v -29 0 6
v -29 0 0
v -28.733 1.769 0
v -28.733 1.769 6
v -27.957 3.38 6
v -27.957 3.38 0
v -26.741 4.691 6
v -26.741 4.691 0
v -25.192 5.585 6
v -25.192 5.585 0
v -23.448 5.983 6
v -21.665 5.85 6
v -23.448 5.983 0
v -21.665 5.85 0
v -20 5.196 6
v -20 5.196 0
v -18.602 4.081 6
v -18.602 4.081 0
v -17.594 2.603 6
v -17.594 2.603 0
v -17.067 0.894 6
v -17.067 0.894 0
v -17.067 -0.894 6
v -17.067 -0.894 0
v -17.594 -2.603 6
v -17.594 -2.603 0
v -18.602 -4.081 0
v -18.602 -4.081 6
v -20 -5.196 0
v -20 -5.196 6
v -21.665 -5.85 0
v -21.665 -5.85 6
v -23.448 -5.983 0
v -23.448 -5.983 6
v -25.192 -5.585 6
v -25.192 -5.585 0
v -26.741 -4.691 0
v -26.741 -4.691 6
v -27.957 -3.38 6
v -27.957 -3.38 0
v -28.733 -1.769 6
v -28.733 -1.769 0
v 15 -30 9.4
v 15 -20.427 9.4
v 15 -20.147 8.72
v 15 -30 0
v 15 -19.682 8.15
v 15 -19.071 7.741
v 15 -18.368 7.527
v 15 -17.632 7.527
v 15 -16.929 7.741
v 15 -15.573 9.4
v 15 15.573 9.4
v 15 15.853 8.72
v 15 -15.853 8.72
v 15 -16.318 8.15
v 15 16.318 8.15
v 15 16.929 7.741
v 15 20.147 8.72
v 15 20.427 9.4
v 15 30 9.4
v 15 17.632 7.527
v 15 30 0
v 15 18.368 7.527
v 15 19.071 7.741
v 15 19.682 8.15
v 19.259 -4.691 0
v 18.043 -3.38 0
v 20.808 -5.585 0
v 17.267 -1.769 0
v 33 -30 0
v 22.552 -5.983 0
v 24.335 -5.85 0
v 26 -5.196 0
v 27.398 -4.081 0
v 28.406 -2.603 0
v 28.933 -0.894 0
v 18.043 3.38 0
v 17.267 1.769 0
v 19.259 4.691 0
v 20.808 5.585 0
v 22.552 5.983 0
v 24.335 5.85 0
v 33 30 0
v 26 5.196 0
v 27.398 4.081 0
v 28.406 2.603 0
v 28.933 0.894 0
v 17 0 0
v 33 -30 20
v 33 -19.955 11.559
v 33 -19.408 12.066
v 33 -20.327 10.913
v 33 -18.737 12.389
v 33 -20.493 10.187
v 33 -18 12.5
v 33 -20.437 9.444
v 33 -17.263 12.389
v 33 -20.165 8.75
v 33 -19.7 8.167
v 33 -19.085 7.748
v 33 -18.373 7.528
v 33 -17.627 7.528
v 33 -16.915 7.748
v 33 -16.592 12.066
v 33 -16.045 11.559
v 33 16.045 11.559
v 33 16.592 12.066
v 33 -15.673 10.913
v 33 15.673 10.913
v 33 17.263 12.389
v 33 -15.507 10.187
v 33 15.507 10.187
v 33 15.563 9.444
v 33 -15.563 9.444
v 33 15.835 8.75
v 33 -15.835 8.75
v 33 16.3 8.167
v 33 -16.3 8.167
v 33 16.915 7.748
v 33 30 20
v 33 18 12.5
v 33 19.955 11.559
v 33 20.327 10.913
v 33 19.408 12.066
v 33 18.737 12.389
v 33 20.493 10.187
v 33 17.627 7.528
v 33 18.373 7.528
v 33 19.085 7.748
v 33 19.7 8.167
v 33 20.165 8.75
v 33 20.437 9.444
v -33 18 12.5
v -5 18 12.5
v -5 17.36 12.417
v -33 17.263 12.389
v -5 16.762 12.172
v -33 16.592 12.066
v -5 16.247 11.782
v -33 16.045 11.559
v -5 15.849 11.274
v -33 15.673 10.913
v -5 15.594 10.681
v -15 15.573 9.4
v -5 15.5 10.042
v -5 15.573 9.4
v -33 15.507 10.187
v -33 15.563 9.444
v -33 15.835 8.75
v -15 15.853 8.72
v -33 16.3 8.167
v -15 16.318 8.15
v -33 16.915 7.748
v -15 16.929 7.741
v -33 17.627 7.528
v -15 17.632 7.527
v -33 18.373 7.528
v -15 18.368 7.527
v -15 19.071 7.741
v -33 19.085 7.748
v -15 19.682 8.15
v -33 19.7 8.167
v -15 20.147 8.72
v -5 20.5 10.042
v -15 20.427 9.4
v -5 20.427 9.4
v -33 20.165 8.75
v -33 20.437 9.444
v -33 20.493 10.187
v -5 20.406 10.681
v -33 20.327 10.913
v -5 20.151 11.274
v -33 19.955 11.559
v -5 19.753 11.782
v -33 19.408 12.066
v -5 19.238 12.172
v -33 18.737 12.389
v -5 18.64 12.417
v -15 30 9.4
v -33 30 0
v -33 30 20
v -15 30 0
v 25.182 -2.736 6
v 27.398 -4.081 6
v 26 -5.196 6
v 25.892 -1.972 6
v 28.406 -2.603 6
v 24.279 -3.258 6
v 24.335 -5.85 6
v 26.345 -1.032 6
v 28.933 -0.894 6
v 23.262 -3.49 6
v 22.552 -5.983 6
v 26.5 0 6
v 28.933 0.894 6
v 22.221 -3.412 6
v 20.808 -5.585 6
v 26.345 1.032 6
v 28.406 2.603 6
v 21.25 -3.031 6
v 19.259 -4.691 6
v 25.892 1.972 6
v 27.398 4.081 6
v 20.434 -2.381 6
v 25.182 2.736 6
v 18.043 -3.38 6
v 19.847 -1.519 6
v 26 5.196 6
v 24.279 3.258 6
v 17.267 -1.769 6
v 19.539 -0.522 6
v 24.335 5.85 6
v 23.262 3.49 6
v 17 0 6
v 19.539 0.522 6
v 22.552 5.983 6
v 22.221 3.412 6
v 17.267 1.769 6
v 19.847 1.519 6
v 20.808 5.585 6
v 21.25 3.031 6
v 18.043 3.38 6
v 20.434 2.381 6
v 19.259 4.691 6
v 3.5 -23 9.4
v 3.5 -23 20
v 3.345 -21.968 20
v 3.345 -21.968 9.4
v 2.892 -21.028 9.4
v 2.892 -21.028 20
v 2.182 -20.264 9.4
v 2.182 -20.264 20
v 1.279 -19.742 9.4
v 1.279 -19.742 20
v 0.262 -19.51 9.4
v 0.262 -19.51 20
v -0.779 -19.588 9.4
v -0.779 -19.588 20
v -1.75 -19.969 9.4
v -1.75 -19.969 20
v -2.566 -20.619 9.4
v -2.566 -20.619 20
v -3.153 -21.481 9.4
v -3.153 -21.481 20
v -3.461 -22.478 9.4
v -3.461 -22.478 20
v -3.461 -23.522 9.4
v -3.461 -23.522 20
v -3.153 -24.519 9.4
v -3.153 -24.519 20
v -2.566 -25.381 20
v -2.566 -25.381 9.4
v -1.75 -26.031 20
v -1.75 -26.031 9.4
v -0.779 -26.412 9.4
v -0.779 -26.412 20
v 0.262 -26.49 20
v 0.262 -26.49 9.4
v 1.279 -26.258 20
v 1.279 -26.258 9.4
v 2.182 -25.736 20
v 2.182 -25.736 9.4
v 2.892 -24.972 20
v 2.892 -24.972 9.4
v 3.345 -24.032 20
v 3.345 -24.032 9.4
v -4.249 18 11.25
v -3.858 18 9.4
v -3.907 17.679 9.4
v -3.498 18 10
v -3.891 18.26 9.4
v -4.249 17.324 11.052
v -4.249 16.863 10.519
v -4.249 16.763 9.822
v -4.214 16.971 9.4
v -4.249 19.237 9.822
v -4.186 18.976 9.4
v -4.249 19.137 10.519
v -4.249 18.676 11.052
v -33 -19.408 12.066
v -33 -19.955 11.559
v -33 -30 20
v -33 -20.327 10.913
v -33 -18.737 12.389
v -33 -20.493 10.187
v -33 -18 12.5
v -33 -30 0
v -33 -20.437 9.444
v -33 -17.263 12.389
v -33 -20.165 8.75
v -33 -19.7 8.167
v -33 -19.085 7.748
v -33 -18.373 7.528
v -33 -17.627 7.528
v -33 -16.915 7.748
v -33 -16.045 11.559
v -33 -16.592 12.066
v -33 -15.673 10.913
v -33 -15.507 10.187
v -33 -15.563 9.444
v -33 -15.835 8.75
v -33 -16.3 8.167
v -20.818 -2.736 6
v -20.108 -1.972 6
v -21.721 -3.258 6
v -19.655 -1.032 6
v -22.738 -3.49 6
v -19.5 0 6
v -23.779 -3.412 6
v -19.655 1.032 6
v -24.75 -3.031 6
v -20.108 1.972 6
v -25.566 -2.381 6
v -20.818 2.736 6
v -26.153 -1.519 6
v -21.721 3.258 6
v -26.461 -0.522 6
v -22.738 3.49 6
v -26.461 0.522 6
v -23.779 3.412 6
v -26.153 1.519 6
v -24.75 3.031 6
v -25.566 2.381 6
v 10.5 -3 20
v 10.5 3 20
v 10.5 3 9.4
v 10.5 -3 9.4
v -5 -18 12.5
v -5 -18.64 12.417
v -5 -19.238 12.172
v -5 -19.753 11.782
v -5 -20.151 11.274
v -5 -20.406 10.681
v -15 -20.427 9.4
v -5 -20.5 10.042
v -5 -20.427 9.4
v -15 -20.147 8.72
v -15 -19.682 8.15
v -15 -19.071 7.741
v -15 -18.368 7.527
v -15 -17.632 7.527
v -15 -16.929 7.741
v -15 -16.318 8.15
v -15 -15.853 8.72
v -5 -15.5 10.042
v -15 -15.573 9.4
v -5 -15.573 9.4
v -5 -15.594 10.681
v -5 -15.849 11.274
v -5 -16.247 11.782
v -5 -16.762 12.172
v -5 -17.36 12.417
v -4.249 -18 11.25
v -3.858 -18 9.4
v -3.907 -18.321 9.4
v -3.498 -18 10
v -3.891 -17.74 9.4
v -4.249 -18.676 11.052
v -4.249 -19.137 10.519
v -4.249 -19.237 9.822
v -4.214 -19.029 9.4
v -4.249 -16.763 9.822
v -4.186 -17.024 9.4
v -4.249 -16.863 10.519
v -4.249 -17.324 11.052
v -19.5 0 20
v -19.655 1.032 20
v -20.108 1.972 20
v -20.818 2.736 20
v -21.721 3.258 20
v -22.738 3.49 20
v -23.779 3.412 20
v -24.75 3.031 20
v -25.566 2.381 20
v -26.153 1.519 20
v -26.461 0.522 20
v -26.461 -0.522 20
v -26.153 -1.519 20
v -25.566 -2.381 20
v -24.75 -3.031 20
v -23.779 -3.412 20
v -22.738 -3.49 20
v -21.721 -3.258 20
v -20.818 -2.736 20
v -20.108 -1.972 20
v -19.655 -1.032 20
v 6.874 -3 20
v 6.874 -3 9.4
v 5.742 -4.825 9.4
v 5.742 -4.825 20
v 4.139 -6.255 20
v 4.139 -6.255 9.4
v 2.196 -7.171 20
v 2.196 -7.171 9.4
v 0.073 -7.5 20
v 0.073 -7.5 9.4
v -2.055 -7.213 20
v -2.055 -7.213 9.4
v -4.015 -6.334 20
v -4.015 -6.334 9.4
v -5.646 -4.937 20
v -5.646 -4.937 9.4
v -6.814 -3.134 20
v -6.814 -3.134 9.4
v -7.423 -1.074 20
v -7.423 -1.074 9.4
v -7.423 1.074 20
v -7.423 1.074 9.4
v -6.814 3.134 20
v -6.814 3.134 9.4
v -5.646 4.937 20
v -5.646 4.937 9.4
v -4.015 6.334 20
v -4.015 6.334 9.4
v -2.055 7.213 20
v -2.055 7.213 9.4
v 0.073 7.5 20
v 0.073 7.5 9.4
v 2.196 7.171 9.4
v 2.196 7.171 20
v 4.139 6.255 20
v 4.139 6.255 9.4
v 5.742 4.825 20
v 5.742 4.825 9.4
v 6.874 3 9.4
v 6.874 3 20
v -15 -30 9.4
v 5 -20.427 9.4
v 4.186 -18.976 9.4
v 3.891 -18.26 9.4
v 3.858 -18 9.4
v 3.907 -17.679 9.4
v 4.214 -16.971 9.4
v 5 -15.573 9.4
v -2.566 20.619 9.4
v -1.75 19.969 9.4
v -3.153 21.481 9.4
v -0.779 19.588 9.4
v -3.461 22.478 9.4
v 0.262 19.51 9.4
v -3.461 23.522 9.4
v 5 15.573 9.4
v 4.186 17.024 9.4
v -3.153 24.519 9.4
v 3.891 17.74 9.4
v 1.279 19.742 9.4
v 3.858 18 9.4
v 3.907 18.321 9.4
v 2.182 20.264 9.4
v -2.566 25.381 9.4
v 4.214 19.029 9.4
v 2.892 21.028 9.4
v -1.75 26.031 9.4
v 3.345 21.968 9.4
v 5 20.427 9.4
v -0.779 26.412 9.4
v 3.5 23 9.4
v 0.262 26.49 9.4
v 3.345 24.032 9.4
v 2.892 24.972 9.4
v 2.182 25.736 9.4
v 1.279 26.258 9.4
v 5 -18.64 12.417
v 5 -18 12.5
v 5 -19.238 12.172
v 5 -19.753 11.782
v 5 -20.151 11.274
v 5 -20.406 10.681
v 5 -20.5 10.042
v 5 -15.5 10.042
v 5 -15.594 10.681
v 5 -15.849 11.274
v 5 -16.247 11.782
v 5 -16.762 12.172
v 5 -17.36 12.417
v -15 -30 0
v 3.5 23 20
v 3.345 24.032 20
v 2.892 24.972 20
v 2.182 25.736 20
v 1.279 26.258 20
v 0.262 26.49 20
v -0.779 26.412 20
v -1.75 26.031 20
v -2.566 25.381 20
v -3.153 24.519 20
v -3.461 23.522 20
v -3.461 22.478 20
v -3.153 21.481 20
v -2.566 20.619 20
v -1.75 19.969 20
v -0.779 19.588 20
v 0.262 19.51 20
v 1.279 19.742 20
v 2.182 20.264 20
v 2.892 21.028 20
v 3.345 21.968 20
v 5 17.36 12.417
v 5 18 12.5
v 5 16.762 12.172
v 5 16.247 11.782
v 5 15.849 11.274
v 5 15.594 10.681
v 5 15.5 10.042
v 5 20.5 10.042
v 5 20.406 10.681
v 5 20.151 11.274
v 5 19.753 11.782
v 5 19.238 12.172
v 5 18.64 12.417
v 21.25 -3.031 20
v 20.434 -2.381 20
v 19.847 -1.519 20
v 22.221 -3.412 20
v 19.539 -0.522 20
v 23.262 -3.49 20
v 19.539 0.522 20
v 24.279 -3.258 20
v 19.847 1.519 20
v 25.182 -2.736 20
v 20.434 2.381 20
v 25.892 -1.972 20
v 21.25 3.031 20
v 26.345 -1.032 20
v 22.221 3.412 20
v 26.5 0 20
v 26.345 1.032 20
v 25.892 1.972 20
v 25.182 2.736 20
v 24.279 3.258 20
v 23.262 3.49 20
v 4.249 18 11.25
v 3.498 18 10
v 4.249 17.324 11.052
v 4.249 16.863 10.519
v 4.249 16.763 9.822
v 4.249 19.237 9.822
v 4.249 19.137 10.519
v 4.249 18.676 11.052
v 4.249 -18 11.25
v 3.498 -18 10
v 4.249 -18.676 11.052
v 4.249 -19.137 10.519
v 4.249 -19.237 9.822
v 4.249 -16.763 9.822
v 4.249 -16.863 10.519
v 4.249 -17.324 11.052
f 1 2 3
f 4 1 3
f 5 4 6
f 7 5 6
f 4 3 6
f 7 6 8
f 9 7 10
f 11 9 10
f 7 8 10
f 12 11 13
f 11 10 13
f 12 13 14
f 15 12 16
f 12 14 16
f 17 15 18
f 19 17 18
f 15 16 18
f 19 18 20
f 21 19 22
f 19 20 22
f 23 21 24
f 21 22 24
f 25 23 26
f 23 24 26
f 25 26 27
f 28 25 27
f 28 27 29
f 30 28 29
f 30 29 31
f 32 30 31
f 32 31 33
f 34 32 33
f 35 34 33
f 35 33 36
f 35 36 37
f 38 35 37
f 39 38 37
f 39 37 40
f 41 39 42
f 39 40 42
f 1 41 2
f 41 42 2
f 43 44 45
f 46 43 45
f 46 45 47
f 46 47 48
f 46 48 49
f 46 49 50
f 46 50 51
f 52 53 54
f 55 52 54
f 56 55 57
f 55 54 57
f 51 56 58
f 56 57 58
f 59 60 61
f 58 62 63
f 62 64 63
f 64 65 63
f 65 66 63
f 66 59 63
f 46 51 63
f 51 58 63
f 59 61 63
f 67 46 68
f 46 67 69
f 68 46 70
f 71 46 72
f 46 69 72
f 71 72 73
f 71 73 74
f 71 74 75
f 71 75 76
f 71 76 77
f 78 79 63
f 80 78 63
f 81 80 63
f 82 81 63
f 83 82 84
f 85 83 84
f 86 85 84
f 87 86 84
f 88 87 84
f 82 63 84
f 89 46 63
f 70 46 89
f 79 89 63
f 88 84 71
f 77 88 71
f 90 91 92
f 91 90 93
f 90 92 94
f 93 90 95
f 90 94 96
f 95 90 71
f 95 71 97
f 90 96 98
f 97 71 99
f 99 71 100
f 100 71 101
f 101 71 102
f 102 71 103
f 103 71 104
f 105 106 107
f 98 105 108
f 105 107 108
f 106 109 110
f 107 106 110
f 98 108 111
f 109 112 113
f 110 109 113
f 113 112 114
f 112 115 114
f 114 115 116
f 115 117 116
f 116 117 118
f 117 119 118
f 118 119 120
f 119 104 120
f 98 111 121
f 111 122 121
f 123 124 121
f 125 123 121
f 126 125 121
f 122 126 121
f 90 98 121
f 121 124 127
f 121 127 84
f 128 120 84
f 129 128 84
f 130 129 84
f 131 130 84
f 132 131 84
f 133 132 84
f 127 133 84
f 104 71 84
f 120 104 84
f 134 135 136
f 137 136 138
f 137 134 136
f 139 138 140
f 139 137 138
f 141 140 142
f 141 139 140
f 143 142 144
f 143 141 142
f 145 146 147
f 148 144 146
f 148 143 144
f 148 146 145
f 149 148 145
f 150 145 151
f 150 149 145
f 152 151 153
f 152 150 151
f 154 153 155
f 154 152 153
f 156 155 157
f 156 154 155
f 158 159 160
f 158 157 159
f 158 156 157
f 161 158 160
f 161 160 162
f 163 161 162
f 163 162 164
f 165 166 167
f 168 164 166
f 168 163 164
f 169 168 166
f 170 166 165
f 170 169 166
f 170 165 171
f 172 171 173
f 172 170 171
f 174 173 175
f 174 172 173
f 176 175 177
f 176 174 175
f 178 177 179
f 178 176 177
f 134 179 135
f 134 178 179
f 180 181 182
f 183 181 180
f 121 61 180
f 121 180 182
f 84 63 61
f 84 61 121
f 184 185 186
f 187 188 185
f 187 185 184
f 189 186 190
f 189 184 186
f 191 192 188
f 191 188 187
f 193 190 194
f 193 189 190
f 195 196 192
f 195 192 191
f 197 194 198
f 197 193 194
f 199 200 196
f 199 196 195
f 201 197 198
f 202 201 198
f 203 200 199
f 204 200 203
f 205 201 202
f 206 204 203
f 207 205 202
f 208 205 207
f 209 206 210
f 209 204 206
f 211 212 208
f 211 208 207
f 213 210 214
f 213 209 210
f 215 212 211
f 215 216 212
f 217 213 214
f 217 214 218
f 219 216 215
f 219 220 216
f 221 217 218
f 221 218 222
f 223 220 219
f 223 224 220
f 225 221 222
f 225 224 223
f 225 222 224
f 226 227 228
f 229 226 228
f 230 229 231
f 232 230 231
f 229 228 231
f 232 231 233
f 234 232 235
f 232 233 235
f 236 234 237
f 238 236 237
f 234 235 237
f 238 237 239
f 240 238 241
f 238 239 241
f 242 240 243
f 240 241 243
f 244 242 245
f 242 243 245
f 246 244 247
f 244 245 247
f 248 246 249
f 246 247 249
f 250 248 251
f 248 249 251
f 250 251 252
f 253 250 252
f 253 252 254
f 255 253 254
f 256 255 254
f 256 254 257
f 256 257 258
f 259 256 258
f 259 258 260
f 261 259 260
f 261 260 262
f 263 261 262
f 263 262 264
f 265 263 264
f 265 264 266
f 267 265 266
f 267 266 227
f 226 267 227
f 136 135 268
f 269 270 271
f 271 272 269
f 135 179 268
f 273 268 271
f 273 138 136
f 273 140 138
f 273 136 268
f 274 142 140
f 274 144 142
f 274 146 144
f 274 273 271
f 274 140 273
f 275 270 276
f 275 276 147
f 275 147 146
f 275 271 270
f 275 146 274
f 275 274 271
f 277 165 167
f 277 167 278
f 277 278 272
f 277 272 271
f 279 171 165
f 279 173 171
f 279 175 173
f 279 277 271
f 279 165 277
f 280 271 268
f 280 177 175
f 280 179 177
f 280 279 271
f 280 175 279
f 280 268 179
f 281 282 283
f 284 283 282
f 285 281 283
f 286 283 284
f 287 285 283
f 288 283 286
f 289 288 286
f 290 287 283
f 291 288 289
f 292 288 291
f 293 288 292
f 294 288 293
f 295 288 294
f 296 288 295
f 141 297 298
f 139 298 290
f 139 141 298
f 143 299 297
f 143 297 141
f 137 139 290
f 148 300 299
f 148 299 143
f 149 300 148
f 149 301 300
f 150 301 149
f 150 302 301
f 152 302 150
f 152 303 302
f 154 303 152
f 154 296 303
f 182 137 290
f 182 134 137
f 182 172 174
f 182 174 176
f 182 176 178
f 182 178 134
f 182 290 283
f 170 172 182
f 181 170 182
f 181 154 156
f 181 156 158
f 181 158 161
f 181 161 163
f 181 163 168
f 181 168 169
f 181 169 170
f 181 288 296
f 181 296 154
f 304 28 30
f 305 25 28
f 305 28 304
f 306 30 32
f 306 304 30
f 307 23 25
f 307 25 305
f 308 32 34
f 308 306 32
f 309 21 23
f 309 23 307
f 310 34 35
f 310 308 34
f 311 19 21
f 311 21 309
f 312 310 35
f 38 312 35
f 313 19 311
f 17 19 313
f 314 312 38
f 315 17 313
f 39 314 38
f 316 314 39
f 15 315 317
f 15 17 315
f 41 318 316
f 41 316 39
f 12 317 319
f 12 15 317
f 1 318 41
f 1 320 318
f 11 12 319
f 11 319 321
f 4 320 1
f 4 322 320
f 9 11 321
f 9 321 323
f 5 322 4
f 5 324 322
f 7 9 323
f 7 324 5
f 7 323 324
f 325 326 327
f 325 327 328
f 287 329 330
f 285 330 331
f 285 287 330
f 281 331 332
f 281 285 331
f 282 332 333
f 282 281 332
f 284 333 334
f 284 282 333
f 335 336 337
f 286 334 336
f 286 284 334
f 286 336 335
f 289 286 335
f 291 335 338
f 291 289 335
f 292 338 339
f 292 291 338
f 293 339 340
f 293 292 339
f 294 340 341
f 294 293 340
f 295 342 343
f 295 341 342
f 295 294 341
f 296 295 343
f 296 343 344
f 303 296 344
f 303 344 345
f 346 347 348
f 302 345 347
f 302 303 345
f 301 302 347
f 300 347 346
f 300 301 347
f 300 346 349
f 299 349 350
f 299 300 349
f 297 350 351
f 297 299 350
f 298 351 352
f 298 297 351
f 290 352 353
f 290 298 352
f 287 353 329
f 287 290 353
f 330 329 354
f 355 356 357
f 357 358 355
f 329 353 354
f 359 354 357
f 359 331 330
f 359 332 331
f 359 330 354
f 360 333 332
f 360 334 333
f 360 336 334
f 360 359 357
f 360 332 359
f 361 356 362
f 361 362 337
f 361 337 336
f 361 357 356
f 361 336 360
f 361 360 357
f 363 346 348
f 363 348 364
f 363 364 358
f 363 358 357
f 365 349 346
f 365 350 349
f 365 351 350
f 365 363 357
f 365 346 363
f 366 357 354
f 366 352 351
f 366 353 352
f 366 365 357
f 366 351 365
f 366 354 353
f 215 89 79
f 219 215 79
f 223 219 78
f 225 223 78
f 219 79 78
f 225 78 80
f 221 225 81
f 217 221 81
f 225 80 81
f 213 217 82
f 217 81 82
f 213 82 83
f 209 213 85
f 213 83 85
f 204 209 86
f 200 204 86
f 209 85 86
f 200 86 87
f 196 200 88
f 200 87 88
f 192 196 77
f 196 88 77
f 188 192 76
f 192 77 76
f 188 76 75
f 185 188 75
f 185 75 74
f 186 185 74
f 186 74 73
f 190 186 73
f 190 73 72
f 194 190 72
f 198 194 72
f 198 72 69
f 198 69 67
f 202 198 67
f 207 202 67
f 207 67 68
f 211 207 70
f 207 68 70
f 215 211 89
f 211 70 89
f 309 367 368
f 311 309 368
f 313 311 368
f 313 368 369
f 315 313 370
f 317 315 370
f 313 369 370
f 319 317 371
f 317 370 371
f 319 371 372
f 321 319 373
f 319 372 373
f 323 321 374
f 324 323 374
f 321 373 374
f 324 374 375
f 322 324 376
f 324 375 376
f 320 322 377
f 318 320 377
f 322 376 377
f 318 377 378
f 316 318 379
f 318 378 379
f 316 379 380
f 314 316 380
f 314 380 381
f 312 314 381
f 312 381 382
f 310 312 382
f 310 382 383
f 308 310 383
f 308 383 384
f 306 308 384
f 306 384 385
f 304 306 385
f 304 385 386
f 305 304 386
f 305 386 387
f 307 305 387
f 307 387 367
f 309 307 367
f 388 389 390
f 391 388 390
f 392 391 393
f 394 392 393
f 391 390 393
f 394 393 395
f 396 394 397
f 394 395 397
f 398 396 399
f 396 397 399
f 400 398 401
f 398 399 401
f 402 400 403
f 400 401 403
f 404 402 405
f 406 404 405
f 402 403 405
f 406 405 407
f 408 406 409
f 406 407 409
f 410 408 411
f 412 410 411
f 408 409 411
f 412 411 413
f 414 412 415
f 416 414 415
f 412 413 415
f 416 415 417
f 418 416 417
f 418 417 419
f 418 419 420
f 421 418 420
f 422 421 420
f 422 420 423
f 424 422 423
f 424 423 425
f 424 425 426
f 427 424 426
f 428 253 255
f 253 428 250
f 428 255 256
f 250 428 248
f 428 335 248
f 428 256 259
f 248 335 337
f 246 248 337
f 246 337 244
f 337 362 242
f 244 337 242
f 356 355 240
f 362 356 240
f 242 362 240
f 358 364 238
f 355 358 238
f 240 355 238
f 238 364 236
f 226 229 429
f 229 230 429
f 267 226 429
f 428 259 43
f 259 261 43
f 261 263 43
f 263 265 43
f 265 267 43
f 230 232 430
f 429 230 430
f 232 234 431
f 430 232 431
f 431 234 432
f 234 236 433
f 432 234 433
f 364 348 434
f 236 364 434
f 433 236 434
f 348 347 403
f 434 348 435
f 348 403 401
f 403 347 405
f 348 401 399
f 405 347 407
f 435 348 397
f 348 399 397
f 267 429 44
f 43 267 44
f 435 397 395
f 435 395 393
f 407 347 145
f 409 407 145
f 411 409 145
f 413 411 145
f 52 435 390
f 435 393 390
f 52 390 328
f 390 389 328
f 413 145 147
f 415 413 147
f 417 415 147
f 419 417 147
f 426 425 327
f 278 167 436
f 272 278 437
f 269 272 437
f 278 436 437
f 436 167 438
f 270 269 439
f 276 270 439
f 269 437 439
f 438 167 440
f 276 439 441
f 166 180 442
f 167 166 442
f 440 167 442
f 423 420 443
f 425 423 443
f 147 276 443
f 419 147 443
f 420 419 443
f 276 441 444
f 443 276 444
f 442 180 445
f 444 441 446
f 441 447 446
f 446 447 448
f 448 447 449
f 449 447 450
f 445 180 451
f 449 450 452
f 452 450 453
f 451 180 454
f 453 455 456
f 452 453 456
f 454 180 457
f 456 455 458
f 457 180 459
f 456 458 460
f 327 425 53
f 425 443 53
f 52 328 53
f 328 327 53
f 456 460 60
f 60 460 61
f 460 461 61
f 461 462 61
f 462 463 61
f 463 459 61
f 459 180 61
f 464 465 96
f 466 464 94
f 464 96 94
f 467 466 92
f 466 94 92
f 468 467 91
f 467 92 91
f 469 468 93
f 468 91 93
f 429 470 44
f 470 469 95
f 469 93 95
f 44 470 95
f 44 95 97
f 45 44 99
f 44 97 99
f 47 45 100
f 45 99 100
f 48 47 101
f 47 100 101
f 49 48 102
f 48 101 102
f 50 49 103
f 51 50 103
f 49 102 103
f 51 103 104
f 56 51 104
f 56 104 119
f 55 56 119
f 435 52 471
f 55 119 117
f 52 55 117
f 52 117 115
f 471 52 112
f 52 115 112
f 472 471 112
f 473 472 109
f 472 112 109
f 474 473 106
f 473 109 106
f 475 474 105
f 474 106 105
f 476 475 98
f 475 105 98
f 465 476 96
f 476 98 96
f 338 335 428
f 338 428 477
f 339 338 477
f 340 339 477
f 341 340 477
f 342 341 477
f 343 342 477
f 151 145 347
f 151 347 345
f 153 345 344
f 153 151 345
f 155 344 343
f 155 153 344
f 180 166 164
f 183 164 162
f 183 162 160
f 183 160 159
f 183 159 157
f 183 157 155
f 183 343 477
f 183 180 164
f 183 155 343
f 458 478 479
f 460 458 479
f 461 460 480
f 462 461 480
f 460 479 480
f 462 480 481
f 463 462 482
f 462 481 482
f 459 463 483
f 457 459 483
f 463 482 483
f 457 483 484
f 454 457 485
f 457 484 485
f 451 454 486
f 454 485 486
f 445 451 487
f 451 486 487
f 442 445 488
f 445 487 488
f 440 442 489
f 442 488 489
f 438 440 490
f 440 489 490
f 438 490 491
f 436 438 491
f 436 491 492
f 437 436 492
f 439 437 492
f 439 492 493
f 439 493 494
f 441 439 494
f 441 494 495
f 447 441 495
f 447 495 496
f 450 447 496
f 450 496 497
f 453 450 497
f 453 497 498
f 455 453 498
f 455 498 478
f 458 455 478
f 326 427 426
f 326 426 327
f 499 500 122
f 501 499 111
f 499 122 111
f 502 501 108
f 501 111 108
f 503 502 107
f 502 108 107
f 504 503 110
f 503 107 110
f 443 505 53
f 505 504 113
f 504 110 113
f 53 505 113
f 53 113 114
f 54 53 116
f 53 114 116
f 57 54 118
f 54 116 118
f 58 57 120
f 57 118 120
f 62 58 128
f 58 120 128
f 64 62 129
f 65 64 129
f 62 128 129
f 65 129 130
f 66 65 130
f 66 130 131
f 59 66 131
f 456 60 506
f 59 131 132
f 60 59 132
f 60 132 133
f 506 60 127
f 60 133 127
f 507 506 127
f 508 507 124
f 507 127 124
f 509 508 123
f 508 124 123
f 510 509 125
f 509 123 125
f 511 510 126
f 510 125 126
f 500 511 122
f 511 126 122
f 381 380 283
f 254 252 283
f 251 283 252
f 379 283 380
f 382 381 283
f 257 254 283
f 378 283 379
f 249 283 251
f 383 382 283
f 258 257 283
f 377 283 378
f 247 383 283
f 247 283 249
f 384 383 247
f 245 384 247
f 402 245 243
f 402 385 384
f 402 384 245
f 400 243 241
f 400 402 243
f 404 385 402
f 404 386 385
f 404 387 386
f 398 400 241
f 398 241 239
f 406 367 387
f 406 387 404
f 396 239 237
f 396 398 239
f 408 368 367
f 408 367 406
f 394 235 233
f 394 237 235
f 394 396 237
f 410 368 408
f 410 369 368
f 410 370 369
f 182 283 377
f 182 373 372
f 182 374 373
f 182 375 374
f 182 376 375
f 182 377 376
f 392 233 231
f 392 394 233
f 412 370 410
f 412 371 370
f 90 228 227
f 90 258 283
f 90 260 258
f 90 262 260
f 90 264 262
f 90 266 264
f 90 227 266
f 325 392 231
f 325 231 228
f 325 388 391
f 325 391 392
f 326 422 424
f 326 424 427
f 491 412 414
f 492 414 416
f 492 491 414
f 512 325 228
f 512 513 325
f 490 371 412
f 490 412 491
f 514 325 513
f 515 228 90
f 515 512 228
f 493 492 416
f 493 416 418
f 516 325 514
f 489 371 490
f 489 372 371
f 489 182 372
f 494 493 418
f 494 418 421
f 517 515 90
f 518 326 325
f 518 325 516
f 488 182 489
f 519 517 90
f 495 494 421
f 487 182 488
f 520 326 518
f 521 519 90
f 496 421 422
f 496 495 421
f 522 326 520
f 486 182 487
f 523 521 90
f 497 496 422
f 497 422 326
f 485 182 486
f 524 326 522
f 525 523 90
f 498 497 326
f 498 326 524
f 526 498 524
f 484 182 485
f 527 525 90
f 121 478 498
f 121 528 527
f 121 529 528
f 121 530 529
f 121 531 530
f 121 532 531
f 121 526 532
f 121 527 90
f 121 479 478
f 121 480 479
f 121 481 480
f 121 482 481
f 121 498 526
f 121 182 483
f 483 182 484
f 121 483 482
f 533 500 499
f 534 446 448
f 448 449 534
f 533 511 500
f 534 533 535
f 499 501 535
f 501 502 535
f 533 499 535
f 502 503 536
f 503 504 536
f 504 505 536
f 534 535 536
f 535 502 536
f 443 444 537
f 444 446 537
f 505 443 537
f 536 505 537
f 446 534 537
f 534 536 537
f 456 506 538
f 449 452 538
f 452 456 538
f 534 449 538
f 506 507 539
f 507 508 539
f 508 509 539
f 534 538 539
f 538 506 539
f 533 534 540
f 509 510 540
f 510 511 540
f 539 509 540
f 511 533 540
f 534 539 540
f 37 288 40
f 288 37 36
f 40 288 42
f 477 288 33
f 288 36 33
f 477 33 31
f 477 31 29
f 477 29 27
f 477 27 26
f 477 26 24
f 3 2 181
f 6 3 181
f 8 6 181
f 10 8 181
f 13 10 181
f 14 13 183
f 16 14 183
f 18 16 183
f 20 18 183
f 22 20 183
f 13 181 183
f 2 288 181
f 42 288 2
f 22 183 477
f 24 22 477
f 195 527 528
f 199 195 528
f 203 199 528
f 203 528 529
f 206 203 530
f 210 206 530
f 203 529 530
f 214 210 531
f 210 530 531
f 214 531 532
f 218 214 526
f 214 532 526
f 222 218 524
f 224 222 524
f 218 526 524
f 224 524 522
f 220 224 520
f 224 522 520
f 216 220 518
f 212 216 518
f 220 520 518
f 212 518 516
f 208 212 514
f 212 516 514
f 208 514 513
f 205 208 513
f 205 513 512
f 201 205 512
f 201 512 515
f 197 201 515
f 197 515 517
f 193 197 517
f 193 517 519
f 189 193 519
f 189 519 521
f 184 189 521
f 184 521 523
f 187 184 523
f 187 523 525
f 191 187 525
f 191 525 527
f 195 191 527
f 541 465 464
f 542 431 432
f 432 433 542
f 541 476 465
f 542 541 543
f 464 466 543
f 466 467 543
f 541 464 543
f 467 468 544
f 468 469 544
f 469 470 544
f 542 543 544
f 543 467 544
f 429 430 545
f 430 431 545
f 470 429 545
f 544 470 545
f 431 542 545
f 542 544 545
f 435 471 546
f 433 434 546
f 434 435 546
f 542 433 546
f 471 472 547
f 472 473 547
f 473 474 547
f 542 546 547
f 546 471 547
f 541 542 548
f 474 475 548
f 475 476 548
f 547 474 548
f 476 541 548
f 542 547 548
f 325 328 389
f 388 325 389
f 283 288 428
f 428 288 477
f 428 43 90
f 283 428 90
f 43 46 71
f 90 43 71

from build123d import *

# Parameters (mm, degrees)
SKETCH1_W                  = 66
SKETCH1_H                  = 60
BOSS_EXTRUDE1_DEPTH        = 20
CUT_EXTRUDE1_REACH         = 62
SKETCH2_W                  = 30
SKETCH2_H                  = 9.4
M6_TAPPED_HOLE1_AT_2_COUNT = 2
M6_TAPPED_HOLE1_AT_2_PITCH = 36
SKETCH7_R                  = 3.5
CUT_EXTRUDE2_DEPTH         = 21
SKETCH9_R                  = 6
CUT_EXTRUDE3_DEPTH         = 6


with BuildPart() as part:
    # Sketch1 → Boss-Extrude1 (new body)
    with BuildSketch(Plane.XY):
        Rectangle(SKETCH1_W, SKETCH1_H)
        with BuildLine():
            Line((10.5, -3), (6.873863542, -3))
            ThreePointArc((6.873863542, -3), (-7.5, 0), (6.873863542, 3))
            Line((6.873863542, 3), (10.5, 3))
            Line((10.5, 3), (10.5, -3))
        make_face(mode=Mode.SUBTRACT)
    extrude(amount=BOSS_EXTRUDE1_DEPTH)

    # Sketch2 → Cut-Extrude1 (cut, up to next)
    with BuildSketch(Plane(origin=(0, 30, 0), x_dir=(1, 0, 0), z_dir=(0, 1, 0)), mode=Mode.PRIVATE) as cut_extrude1_sk1:
        with Locations((0, -4.7)):
            Rectangle(SKETCH2_W, SKETCH2_H)
    cut_extrude1_tool1 = extrude(cut_extrude1_sk1.sketch, amount=-CUT_EXTRUDE1_REACH, mode=Mode.PRIVATE) & part.part
    add(cut_extrude1_tool1.solids().sort_by_distance((0, 30, 4.7))[0], mode=Mode.SUBTRACT)

    # Sketch5 → M6 Tapped Hole1 (revolve, cut)
    with BuildSketch(Plane(origin=(-33, 18, 10), x_dir=(0, 0, 1), z_dir=(0, 1, 0))):
        Polygon((0, 0), (0, 29.502151548), (2.5, 28), (2.5, 0), align=None)
    m6_tapped_hole1 = revolve(axis=Axis((-39.35, 18, 10), (1, 0, 0)), mode=Mode.SUBTRACT)

    # M6 Tapped Hole1 at 2: M6 Tapped Hole1 ×2
    with Locations(*[(0, -i * M6_TAPPED_HOLE1_AT_2_PITCH, 0) for i in range(1, M6_TAPPED_HOLE1_AT_2_COUNT)]):
        add(m6_tapped_hole1, mode=Mode.SUBTRACT)

    # Mirror1: M6 Tapped Hole1 across plane
    add(m6_tapped_hole1.mirror(Plane(origin=(0, 0, 0), x_dir=(0, 0, 1), z_dir=(1, 0, 0))), mode=Mode.SUBTRACT)

    # Mirror1 copy 1 sketch → Mirror1 copy 1 (revolve, cut)
    with BuildSketch(Plane(origin=(33, -18, 10), x_dir=(0, 0, 1), z_dir=(0, 1, 0))):
        Polygon((0, 0), (0, -29.502151548), (2.5, -28), (2.5, 0), align=None)
    revolve(axis=Axis((39.35, -18, 10), (1, 0, 0)), mode=Mode.SUBTRACT)

    # Sketch7 → Cut-Extrude2 (cut, through all)
    with BuildSketch(Plane.XY.offset(20)):
        with Locations((0, 23)):
            Circle(SKETCH7_R)
        with Locations((23, 0)):
            Circle(SKETCH7_R)
        with Locations((0, -23)):
            Circle(SKETCH7_R)
        with Locations((-23, 0)):
            Circle(SKETCH7_R)
    extrude(amount=-CUT_EXTRUDE2_DEPTH, mode=Mode.SUBTRACT)

    # Sketch9 → Cut-Extrude3 (cut)
    with BuildSketch(Plane(origin=(0, 0, 0), x_dir=(-1, 0, 0), z_dir=(0, 0, -1))):
        with Locations((23, 0)):
            Circle(SKETCH9_R)
        with Locations((-23, 0)):
            Circle(SKETCH9_R)
    extrude(amount=-CUT_EXTRUDE3_DEPTH, mode=Mode.SUBTRACT)


solid = part.part
